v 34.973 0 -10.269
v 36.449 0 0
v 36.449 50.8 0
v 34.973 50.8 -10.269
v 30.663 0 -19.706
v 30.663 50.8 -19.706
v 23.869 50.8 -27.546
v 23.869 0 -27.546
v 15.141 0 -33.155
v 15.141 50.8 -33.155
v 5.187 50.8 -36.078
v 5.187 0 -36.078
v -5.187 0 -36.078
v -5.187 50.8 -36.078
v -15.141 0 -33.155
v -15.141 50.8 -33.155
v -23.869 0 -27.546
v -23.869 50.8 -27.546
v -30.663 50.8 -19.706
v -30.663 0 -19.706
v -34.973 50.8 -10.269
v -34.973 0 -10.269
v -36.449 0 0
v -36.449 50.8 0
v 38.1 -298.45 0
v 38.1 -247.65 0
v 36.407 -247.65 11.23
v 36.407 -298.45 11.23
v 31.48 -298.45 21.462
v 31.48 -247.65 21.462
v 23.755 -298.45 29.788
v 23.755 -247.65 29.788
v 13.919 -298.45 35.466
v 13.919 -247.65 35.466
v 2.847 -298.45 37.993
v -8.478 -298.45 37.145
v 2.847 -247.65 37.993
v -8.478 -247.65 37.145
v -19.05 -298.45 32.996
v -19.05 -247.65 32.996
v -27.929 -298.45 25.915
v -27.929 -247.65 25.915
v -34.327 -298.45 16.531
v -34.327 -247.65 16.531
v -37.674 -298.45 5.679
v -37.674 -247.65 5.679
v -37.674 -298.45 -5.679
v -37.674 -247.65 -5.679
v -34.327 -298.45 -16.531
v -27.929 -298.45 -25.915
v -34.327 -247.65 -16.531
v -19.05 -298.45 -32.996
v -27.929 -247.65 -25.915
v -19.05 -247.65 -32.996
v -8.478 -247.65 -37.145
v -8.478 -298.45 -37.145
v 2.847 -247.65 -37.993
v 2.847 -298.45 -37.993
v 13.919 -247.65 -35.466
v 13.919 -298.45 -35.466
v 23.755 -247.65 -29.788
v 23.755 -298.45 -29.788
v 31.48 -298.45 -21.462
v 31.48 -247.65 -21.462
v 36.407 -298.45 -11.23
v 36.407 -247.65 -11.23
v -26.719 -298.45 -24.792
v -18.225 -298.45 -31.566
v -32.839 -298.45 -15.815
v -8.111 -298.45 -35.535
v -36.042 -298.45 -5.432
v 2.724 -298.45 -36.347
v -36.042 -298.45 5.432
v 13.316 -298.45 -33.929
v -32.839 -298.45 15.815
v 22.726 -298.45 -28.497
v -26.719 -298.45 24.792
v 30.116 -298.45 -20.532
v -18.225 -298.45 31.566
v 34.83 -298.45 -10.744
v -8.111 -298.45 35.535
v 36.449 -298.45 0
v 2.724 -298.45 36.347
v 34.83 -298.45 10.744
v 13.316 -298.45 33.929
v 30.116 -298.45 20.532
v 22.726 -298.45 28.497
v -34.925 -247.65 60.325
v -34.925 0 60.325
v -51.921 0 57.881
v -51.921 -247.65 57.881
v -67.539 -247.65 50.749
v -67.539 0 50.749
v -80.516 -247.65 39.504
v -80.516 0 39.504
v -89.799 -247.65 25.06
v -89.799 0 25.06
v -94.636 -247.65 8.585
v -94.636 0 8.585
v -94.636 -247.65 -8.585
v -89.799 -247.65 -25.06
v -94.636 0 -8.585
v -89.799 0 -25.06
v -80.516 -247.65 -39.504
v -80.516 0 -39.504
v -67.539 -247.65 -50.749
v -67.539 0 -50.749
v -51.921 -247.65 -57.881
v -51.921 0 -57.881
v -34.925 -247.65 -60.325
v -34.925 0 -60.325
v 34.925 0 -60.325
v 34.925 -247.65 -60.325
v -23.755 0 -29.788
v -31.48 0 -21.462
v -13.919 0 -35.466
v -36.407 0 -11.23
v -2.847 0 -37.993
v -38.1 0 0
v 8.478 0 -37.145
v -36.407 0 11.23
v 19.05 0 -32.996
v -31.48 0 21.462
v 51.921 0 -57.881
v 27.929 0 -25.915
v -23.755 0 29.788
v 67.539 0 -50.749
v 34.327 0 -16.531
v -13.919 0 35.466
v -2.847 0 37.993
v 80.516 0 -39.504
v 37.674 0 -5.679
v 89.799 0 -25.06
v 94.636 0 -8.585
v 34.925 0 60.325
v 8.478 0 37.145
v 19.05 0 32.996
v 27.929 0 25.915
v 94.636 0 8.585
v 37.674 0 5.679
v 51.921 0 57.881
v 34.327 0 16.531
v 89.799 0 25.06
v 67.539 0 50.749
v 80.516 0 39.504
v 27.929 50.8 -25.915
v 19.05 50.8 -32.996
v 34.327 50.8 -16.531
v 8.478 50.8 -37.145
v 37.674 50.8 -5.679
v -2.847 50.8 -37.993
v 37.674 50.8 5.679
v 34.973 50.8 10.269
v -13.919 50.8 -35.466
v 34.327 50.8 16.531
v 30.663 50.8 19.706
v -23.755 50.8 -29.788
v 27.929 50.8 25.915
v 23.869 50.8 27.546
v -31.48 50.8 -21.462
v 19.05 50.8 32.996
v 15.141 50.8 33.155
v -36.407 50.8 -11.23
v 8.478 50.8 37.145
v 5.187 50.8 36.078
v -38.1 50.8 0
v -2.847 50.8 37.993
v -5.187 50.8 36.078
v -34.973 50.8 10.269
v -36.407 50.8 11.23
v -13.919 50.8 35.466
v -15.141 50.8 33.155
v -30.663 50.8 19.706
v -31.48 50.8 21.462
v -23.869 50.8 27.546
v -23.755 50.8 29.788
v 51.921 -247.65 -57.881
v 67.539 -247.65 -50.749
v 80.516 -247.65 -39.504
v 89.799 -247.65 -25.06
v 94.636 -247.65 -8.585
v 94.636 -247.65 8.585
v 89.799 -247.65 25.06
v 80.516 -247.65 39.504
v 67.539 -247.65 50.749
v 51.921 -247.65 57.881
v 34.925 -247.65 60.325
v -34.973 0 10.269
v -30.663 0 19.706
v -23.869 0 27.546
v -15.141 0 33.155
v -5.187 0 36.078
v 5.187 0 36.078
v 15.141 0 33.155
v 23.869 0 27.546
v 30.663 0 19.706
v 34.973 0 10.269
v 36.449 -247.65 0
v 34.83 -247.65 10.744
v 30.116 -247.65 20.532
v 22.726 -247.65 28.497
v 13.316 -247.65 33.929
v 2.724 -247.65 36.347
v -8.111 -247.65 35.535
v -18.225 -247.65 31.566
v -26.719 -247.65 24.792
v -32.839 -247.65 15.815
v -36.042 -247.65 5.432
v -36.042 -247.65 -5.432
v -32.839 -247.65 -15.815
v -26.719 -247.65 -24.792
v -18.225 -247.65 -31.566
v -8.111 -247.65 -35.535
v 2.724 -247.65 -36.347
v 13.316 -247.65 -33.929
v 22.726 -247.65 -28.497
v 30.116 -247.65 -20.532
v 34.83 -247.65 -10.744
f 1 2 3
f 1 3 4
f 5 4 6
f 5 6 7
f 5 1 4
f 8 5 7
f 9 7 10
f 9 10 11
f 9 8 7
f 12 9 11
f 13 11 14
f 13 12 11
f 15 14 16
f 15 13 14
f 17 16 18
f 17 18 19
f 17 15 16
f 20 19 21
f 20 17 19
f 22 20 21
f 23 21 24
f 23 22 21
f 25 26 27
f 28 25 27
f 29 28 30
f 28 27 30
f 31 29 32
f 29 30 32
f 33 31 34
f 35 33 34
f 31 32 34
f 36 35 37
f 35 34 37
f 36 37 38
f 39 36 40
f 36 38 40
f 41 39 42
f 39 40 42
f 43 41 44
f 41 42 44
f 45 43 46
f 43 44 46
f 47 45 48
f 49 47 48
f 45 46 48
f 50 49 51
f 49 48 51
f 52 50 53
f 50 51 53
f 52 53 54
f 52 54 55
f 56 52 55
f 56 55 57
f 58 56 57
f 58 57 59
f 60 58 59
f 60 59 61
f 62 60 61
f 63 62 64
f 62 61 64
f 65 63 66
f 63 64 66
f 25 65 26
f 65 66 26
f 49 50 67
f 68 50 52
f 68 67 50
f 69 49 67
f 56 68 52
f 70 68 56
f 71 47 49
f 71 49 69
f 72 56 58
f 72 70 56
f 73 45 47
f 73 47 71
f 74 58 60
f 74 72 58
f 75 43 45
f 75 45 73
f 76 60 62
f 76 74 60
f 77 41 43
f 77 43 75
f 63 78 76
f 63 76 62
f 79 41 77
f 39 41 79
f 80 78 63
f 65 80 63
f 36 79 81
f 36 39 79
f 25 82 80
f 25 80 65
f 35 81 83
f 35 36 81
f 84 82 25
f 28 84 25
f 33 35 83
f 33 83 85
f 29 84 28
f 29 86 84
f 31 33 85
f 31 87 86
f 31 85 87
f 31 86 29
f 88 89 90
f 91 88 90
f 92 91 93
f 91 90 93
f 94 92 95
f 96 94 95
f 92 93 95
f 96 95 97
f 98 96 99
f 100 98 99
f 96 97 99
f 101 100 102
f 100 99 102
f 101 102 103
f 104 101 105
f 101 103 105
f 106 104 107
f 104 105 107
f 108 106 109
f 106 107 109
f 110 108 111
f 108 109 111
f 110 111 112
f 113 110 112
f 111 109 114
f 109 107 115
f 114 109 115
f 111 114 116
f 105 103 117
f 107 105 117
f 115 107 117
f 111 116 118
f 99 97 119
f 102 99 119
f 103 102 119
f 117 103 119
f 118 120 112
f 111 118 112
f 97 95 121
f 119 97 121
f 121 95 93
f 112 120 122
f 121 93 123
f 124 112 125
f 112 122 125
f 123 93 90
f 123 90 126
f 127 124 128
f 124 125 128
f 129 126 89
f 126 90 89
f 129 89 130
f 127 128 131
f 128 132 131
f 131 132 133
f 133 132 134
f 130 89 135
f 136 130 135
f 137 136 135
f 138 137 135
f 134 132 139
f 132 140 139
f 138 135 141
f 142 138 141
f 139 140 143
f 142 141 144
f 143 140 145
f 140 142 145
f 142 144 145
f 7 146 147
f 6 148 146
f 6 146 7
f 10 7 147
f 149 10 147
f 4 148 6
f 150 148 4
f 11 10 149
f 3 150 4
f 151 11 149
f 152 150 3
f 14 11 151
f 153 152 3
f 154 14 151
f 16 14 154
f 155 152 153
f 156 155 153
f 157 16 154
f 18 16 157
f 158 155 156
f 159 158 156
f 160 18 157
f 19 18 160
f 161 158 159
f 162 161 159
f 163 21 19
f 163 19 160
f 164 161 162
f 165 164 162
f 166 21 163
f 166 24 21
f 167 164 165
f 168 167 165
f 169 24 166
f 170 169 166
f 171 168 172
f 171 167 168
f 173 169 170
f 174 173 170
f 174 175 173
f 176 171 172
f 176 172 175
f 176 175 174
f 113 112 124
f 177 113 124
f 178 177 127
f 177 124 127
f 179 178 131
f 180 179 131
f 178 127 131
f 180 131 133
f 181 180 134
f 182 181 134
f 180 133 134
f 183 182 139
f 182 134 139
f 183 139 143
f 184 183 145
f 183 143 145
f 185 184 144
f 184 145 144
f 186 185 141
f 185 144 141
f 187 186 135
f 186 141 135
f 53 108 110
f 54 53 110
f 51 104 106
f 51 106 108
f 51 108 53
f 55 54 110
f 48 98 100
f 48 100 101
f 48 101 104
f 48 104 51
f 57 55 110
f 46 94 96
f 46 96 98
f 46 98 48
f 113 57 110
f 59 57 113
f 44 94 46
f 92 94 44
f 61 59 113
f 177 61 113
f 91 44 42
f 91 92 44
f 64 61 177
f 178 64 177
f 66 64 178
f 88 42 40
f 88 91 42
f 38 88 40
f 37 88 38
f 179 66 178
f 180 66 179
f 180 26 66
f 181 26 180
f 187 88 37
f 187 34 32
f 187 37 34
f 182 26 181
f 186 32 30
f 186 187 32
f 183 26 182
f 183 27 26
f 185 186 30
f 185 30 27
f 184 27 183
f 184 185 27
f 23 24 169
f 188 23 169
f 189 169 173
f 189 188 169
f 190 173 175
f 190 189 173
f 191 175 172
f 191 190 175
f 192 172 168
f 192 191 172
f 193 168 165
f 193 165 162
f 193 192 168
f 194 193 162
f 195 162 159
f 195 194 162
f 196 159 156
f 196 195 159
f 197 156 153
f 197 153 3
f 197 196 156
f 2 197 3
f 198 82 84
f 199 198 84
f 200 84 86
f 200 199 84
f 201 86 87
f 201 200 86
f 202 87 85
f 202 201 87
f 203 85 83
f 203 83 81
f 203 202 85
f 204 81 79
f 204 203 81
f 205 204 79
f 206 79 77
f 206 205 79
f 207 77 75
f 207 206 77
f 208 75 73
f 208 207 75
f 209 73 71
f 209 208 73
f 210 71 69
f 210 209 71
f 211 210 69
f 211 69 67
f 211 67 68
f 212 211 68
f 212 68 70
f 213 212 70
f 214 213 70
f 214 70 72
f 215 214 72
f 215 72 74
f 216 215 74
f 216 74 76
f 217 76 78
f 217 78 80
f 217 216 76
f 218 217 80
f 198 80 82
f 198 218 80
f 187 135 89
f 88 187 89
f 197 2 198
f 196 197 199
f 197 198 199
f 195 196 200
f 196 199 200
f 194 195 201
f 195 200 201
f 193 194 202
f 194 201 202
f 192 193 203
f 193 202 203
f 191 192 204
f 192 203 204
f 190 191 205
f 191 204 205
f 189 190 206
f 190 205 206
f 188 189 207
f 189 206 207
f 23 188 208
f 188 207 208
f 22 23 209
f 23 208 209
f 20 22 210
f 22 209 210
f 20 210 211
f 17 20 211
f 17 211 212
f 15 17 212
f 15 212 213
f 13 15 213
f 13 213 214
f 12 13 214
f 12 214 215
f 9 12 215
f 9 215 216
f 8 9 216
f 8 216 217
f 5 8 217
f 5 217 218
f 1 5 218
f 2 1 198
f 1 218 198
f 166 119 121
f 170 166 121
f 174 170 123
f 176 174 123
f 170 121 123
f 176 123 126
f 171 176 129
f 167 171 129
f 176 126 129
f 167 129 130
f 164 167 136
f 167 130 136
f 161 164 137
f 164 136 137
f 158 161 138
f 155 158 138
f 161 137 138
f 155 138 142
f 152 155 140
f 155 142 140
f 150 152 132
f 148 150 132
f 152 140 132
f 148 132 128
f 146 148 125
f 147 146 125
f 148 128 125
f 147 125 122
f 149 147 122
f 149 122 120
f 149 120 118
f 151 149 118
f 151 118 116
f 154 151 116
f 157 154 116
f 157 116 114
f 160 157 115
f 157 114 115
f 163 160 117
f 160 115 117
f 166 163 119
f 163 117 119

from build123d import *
from build123d import SkipClean  # not in build123d's __all__

# Parameters (mm, degrees)
F1_DEPTH = 247.65
F2_R     = 38.1
F2_R_2   = 36.449
F3_DEPTH = 50.8
F4_R     = 38.1
F4_R_2   = 36.449
F5_DEPTH = 50.8
F6_DEPTH = 330.2


with BuildPart() as f1:
    # F0 (on Front) → F1 (new body)
    with BuildSketch(Plane.XZ):
        with BuildLine():
            Line((34.925, 60.325), (-34.925, 60.325))
            ThreePointArc((-34.925, 60.325), (-95.25, 0), (-34.925, -60.325))
            Line((-34.925, -60.325), (34.925, -60.325))
            ThreePointArc((34.925, -60.325), (95.25, 0), (34.925, 60.325))
        make_face()
    extrude(amount=F1_DEPTH)

    # F2 (on face) → F3 (join)
    with BuildSketch(Plane.XZ.offset(247.65)):
        Circle(F2_R)
        Circle(F2_R_2, mode=Mode.SUBTRACT)
    extrude(amount=F3_DEPTH)

    # F4 (on face) → F5 (join)
    with BuildSketch(Plane(origin=(0, 0, 0), x_dir=(-1, 0, 0), z_dir=(0, 1, 0))):
        Circle(F4_R)
        Circle(F4_R_2, mode=Mode.SUBTRACT)
    extrude(amount=F5_DEPTH)

    # F6 (cut): a face of the model
    f6_faces = [f1.faces().sort_by_distance(p)[0] for p in [
        (0, -247.65, 0),
    ]]
    with SkipClean():  # cleaning this boolean's faces spoils the solid; the shape is the same uncleaned
        extrude(f6_faces, amount=-F6_DEPTH, mode=Mode.SUBTRACT)


solid = f1.part
